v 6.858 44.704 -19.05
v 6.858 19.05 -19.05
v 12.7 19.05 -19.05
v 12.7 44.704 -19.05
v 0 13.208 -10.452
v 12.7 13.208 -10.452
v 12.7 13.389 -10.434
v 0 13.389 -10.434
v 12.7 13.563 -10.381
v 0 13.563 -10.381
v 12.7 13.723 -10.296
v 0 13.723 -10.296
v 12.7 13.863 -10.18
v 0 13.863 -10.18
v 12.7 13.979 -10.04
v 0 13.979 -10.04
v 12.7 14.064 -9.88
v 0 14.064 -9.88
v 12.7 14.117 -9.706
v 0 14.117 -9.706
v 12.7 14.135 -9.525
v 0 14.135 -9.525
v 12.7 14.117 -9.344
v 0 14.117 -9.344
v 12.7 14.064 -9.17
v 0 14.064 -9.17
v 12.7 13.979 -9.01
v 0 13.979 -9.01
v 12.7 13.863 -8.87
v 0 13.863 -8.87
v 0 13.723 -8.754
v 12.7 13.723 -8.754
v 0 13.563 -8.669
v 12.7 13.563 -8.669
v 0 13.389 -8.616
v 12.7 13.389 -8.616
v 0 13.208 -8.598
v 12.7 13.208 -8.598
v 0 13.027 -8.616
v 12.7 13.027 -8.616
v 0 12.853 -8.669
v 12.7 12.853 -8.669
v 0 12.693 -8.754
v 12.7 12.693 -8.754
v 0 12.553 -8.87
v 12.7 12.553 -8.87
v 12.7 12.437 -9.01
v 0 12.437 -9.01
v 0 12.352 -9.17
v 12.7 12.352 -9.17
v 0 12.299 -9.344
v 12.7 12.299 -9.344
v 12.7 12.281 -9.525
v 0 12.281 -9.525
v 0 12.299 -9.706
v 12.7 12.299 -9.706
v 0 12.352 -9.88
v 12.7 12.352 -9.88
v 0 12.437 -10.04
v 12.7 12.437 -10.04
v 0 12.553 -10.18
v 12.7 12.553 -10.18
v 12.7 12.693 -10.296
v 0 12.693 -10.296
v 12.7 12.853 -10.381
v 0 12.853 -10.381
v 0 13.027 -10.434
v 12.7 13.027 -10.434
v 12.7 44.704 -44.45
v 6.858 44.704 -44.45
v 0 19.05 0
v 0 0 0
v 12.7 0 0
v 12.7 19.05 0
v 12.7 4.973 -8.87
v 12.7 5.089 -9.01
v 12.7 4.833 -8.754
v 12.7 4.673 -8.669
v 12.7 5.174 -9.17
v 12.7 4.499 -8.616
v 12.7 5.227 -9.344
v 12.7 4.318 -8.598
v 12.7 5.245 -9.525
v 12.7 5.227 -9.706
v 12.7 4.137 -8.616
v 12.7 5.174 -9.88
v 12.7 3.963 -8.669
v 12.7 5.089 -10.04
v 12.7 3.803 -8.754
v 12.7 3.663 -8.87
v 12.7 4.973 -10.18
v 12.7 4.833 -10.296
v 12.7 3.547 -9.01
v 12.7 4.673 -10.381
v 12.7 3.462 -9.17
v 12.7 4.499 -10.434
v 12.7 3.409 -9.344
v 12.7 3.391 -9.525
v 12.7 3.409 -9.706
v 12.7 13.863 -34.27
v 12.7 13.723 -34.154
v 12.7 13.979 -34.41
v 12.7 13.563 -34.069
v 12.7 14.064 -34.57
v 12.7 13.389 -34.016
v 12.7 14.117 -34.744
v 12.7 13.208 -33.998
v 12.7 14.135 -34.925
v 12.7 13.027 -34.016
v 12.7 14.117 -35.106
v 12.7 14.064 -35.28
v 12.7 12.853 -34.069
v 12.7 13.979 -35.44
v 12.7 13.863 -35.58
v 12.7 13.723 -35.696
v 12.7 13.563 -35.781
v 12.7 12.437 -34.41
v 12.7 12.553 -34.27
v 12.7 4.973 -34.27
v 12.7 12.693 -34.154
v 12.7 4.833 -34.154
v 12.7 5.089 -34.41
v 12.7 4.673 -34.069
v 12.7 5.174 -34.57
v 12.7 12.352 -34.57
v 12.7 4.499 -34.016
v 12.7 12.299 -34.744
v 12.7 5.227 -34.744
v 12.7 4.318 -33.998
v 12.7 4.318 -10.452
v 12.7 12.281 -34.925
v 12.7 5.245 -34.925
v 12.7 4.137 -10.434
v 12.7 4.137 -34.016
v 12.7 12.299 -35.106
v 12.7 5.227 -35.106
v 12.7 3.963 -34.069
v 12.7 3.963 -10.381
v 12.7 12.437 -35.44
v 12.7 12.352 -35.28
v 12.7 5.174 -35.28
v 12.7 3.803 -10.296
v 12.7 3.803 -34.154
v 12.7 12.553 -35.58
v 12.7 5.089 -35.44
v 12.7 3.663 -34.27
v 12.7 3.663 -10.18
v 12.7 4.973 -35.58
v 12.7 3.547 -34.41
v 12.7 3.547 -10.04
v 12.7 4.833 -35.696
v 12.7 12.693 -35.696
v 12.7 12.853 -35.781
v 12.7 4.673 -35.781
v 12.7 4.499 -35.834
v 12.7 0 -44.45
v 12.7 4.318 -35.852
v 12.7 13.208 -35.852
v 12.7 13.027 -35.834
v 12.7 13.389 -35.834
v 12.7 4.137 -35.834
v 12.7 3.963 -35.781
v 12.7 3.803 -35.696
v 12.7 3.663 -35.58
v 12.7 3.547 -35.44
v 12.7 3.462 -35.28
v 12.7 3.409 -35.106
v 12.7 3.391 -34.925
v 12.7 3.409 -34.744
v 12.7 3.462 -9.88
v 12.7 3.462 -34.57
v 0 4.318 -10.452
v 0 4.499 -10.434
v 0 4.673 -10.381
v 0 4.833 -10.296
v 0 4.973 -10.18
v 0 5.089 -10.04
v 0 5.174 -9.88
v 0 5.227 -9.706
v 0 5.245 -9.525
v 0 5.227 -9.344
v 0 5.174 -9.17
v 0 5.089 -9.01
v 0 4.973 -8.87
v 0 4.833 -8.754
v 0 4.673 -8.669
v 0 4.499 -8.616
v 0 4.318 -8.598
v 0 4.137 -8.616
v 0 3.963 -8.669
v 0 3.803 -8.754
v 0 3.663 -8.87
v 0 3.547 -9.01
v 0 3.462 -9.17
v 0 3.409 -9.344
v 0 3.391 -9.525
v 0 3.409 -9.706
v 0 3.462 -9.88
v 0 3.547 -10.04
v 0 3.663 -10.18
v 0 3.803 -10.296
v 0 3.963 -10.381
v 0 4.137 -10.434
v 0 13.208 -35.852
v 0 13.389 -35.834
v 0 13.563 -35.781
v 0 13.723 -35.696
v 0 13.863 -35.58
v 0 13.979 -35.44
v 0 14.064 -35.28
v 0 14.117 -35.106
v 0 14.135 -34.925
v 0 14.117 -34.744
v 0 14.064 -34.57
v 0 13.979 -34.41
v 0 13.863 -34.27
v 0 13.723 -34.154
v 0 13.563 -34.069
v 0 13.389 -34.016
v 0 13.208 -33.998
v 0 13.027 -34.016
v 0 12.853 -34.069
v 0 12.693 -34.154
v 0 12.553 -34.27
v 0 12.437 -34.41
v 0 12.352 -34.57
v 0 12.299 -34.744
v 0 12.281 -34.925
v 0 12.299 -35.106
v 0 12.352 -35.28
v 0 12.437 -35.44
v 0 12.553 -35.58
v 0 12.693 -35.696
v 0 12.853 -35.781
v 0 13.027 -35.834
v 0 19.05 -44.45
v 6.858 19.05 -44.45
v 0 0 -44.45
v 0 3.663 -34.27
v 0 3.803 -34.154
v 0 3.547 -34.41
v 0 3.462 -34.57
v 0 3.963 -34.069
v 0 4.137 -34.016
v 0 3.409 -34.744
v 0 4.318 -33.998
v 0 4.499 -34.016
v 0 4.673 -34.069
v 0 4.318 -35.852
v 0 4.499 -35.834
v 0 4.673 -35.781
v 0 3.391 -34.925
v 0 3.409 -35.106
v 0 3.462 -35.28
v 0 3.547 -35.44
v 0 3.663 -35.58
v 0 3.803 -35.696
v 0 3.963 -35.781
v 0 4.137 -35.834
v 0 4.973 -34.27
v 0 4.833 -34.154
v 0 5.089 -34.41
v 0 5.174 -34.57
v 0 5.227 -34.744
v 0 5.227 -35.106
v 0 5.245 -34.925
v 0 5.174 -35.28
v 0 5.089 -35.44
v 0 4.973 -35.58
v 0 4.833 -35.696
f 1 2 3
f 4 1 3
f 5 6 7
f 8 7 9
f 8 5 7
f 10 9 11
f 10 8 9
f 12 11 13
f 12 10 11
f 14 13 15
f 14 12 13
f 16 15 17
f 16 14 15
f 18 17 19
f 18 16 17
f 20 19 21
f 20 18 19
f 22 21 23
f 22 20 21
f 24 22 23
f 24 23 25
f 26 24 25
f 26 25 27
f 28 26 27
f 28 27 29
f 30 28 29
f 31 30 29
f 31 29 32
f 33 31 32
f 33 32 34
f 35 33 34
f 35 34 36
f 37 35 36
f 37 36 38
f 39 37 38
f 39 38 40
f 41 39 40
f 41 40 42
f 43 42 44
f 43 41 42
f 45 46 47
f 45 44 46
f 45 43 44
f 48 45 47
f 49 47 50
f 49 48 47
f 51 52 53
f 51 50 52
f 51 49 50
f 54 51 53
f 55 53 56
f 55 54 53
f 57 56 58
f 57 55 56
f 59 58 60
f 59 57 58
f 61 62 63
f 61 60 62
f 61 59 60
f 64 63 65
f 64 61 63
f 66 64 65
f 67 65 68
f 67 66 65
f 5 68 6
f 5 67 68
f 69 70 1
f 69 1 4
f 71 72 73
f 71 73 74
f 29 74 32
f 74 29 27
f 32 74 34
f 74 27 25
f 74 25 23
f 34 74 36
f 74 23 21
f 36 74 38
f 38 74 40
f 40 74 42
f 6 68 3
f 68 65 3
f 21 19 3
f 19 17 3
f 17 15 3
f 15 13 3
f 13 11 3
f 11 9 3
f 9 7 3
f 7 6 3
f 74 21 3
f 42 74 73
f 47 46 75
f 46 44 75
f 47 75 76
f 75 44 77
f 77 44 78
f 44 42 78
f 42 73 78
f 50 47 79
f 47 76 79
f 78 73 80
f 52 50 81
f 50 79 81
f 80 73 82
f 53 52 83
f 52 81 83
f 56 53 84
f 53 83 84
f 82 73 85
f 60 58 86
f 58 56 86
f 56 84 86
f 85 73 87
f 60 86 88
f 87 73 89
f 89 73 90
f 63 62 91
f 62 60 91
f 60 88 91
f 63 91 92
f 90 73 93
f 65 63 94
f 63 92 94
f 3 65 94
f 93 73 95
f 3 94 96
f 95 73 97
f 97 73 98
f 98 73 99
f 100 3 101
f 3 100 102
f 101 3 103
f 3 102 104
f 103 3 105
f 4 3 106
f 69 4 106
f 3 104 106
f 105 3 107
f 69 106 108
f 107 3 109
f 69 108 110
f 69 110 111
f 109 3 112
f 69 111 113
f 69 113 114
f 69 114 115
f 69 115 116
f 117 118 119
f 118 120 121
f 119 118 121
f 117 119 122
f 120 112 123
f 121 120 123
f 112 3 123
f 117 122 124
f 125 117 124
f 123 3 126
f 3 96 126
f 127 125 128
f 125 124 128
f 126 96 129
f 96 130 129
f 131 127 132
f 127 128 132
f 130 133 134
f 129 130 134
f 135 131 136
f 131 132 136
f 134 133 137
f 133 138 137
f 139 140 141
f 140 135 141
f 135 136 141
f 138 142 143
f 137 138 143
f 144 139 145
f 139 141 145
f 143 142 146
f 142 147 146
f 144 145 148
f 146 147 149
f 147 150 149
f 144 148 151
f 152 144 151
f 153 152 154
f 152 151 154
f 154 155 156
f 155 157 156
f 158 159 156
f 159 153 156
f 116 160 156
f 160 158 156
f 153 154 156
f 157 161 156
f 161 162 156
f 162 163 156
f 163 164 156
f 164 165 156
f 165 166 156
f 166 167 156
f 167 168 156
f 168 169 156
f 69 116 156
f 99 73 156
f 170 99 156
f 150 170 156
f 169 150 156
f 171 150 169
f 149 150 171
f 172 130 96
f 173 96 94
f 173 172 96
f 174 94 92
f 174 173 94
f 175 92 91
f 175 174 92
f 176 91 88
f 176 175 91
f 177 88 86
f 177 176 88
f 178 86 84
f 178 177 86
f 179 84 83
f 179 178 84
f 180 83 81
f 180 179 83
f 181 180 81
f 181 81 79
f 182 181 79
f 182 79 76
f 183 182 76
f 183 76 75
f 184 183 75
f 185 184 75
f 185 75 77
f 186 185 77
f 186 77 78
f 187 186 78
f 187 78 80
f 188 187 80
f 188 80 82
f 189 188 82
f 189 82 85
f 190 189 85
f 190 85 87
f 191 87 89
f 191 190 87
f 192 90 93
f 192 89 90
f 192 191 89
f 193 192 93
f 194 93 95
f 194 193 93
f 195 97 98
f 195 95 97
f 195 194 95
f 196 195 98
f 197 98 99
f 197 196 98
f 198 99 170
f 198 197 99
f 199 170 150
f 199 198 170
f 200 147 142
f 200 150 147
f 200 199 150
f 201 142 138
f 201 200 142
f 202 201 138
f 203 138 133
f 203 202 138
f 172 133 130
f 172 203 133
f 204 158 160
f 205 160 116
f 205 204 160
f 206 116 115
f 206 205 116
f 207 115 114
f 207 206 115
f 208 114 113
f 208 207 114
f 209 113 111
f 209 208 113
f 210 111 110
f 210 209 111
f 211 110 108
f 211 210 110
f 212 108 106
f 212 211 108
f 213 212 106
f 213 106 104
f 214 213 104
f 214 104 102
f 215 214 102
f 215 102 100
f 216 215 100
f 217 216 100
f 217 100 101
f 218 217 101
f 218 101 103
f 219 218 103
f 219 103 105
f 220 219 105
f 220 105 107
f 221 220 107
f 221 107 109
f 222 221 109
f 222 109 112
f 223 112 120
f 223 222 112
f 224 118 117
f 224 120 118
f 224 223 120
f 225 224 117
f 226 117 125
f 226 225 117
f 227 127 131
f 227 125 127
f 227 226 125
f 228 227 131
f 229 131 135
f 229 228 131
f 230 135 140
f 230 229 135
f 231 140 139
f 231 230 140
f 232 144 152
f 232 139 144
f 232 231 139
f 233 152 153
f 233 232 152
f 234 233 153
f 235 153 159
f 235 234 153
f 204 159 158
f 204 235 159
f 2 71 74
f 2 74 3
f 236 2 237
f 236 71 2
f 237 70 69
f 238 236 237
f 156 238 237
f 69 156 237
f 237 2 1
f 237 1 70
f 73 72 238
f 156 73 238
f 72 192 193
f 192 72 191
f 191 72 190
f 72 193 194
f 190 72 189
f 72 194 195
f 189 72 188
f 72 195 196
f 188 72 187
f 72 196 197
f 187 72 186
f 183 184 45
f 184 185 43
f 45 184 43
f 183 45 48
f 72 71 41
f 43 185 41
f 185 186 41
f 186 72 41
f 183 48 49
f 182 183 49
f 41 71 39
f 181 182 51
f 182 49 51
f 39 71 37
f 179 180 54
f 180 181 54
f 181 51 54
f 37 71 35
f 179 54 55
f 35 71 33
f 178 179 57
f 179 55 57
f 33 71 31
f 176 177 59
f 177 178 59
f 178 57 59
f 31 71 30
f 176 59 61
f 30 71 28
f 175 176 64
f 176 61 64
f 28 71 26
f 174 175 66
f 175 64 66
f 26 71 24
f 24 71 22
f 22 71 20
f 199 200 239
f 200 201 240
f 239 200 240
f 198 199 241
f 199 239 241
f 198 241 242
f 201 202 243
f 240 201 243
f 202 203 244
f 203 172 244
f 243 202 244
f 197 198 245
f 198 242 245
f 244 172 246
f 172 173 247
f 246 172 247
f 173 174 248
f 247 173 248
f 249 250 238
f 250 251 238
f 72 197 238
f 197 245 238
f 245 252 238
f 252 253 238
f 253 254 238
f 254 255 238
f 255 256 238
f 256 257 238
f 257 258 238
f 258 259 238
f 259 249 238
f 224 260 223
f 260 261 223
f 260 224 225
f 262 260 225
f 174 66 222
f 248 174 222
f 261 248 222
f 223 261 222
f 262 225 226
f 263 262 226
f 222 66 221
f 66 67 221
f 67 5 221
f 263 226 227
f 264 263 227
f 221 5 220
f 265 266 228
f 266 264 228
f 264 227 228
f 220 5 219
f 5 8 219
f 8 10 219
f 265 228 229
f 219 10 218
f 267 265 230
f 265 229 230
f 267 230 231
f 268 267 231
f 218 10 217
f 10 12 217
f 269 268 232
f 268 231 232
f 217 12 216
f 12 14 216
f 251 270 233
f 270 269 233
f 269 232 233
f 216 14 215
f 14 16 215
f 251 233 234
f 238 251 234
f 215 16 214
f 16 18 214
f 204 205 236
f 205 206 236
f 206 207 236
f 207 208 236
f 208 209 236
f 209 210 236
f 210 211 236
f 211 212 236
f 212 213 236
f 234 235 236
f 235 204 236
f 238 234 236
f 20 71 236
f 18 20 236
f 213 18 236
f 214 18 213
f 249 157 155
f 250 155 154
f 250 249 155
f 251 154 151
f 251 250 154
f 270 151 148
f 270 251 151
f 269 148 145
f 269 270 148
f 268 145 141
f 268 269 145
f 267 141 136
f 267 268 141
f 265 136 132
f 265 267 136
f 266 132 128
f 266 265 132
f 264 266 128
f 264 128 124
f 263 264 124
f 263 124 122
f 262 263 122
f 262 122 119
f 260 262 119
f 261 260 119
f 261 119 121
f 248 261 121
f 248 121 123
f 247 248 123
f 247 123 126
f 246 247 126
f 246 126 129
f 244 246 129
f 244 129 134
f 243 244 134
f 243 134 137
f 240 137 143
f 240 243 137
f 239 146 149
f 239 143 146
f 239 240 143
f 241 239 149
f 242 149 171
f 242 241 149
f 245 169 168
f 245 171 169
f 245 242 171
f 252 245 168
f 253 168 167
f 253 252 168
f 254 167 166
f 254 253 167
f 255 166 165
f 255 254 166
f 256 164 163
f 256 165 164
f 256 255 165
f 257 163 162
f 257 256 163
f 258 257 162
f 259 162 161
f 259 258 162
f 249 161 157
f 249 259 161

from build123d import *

# Parameters (mm, degrees)
SKETCH1_W           = 44.45
SKETCH1_H           = 19.05
BOSS_EXTRUDE1_DEPTH = 12.7
SKETCH3_R           = 0.927000051
CUT_EXTRUDE1_DEPTH  = 50.99995
SKETCH4_W           = 5.842
SKETCH4_H           = 25.4
BOSS_EXTRUDE2_DEPTH = 25.654


with BuildPart() as part:
    # Sketch1 → Boss-Extrude1 (new body)
    with BuildSketch(Plane(origin=(0, 0, 0), x_dir=(0, 0, -1), z_dir=(1, 0, 0))):
        with Locations((22.225, 9.525)):
            Rectangle(SKETCH1_W, SKETCH1_H)
    extrude(amount=BOSS_EXTRUDE1_DEPTH)

    # Sketch3 → Cut-Extrude1 (cut, through all)
    with BuildSketch(Plane(origin=(0, 0, 0), x_dir=(0, 0, -1), z_dir=(1, 0, 0))):
        with Locations((9.525, 4.318)):
            Circle(SKETCH3_R)
        with Locations((34.925, 4.318)):
            Circle(SKETCH3_R)
        with Locations((34.925, 13.208)):
            Circle(SKETCH3_R)
        with Locations((9.525, 13.208)):
            Circle(SKETCH3_R)
    extrude(amount=CUT_EXTRUDE1_DEPTH, mode=Mode.SUBTRACT)

    # Sketch4 → Boss-Extrude2 (add)
    with BuildSketch(Plane(origin=(0, 19.05, 0), x_dir=(1, 0, 0), z_dir=(0, 1, 0))):
        with Locations((9.779, 31.75)):
            Rectangle(SKETCH4_W, SKETCH4_H)
    extrude(amount=BOSS_EXTRUDE2_DEPTH)


solid = part.part
